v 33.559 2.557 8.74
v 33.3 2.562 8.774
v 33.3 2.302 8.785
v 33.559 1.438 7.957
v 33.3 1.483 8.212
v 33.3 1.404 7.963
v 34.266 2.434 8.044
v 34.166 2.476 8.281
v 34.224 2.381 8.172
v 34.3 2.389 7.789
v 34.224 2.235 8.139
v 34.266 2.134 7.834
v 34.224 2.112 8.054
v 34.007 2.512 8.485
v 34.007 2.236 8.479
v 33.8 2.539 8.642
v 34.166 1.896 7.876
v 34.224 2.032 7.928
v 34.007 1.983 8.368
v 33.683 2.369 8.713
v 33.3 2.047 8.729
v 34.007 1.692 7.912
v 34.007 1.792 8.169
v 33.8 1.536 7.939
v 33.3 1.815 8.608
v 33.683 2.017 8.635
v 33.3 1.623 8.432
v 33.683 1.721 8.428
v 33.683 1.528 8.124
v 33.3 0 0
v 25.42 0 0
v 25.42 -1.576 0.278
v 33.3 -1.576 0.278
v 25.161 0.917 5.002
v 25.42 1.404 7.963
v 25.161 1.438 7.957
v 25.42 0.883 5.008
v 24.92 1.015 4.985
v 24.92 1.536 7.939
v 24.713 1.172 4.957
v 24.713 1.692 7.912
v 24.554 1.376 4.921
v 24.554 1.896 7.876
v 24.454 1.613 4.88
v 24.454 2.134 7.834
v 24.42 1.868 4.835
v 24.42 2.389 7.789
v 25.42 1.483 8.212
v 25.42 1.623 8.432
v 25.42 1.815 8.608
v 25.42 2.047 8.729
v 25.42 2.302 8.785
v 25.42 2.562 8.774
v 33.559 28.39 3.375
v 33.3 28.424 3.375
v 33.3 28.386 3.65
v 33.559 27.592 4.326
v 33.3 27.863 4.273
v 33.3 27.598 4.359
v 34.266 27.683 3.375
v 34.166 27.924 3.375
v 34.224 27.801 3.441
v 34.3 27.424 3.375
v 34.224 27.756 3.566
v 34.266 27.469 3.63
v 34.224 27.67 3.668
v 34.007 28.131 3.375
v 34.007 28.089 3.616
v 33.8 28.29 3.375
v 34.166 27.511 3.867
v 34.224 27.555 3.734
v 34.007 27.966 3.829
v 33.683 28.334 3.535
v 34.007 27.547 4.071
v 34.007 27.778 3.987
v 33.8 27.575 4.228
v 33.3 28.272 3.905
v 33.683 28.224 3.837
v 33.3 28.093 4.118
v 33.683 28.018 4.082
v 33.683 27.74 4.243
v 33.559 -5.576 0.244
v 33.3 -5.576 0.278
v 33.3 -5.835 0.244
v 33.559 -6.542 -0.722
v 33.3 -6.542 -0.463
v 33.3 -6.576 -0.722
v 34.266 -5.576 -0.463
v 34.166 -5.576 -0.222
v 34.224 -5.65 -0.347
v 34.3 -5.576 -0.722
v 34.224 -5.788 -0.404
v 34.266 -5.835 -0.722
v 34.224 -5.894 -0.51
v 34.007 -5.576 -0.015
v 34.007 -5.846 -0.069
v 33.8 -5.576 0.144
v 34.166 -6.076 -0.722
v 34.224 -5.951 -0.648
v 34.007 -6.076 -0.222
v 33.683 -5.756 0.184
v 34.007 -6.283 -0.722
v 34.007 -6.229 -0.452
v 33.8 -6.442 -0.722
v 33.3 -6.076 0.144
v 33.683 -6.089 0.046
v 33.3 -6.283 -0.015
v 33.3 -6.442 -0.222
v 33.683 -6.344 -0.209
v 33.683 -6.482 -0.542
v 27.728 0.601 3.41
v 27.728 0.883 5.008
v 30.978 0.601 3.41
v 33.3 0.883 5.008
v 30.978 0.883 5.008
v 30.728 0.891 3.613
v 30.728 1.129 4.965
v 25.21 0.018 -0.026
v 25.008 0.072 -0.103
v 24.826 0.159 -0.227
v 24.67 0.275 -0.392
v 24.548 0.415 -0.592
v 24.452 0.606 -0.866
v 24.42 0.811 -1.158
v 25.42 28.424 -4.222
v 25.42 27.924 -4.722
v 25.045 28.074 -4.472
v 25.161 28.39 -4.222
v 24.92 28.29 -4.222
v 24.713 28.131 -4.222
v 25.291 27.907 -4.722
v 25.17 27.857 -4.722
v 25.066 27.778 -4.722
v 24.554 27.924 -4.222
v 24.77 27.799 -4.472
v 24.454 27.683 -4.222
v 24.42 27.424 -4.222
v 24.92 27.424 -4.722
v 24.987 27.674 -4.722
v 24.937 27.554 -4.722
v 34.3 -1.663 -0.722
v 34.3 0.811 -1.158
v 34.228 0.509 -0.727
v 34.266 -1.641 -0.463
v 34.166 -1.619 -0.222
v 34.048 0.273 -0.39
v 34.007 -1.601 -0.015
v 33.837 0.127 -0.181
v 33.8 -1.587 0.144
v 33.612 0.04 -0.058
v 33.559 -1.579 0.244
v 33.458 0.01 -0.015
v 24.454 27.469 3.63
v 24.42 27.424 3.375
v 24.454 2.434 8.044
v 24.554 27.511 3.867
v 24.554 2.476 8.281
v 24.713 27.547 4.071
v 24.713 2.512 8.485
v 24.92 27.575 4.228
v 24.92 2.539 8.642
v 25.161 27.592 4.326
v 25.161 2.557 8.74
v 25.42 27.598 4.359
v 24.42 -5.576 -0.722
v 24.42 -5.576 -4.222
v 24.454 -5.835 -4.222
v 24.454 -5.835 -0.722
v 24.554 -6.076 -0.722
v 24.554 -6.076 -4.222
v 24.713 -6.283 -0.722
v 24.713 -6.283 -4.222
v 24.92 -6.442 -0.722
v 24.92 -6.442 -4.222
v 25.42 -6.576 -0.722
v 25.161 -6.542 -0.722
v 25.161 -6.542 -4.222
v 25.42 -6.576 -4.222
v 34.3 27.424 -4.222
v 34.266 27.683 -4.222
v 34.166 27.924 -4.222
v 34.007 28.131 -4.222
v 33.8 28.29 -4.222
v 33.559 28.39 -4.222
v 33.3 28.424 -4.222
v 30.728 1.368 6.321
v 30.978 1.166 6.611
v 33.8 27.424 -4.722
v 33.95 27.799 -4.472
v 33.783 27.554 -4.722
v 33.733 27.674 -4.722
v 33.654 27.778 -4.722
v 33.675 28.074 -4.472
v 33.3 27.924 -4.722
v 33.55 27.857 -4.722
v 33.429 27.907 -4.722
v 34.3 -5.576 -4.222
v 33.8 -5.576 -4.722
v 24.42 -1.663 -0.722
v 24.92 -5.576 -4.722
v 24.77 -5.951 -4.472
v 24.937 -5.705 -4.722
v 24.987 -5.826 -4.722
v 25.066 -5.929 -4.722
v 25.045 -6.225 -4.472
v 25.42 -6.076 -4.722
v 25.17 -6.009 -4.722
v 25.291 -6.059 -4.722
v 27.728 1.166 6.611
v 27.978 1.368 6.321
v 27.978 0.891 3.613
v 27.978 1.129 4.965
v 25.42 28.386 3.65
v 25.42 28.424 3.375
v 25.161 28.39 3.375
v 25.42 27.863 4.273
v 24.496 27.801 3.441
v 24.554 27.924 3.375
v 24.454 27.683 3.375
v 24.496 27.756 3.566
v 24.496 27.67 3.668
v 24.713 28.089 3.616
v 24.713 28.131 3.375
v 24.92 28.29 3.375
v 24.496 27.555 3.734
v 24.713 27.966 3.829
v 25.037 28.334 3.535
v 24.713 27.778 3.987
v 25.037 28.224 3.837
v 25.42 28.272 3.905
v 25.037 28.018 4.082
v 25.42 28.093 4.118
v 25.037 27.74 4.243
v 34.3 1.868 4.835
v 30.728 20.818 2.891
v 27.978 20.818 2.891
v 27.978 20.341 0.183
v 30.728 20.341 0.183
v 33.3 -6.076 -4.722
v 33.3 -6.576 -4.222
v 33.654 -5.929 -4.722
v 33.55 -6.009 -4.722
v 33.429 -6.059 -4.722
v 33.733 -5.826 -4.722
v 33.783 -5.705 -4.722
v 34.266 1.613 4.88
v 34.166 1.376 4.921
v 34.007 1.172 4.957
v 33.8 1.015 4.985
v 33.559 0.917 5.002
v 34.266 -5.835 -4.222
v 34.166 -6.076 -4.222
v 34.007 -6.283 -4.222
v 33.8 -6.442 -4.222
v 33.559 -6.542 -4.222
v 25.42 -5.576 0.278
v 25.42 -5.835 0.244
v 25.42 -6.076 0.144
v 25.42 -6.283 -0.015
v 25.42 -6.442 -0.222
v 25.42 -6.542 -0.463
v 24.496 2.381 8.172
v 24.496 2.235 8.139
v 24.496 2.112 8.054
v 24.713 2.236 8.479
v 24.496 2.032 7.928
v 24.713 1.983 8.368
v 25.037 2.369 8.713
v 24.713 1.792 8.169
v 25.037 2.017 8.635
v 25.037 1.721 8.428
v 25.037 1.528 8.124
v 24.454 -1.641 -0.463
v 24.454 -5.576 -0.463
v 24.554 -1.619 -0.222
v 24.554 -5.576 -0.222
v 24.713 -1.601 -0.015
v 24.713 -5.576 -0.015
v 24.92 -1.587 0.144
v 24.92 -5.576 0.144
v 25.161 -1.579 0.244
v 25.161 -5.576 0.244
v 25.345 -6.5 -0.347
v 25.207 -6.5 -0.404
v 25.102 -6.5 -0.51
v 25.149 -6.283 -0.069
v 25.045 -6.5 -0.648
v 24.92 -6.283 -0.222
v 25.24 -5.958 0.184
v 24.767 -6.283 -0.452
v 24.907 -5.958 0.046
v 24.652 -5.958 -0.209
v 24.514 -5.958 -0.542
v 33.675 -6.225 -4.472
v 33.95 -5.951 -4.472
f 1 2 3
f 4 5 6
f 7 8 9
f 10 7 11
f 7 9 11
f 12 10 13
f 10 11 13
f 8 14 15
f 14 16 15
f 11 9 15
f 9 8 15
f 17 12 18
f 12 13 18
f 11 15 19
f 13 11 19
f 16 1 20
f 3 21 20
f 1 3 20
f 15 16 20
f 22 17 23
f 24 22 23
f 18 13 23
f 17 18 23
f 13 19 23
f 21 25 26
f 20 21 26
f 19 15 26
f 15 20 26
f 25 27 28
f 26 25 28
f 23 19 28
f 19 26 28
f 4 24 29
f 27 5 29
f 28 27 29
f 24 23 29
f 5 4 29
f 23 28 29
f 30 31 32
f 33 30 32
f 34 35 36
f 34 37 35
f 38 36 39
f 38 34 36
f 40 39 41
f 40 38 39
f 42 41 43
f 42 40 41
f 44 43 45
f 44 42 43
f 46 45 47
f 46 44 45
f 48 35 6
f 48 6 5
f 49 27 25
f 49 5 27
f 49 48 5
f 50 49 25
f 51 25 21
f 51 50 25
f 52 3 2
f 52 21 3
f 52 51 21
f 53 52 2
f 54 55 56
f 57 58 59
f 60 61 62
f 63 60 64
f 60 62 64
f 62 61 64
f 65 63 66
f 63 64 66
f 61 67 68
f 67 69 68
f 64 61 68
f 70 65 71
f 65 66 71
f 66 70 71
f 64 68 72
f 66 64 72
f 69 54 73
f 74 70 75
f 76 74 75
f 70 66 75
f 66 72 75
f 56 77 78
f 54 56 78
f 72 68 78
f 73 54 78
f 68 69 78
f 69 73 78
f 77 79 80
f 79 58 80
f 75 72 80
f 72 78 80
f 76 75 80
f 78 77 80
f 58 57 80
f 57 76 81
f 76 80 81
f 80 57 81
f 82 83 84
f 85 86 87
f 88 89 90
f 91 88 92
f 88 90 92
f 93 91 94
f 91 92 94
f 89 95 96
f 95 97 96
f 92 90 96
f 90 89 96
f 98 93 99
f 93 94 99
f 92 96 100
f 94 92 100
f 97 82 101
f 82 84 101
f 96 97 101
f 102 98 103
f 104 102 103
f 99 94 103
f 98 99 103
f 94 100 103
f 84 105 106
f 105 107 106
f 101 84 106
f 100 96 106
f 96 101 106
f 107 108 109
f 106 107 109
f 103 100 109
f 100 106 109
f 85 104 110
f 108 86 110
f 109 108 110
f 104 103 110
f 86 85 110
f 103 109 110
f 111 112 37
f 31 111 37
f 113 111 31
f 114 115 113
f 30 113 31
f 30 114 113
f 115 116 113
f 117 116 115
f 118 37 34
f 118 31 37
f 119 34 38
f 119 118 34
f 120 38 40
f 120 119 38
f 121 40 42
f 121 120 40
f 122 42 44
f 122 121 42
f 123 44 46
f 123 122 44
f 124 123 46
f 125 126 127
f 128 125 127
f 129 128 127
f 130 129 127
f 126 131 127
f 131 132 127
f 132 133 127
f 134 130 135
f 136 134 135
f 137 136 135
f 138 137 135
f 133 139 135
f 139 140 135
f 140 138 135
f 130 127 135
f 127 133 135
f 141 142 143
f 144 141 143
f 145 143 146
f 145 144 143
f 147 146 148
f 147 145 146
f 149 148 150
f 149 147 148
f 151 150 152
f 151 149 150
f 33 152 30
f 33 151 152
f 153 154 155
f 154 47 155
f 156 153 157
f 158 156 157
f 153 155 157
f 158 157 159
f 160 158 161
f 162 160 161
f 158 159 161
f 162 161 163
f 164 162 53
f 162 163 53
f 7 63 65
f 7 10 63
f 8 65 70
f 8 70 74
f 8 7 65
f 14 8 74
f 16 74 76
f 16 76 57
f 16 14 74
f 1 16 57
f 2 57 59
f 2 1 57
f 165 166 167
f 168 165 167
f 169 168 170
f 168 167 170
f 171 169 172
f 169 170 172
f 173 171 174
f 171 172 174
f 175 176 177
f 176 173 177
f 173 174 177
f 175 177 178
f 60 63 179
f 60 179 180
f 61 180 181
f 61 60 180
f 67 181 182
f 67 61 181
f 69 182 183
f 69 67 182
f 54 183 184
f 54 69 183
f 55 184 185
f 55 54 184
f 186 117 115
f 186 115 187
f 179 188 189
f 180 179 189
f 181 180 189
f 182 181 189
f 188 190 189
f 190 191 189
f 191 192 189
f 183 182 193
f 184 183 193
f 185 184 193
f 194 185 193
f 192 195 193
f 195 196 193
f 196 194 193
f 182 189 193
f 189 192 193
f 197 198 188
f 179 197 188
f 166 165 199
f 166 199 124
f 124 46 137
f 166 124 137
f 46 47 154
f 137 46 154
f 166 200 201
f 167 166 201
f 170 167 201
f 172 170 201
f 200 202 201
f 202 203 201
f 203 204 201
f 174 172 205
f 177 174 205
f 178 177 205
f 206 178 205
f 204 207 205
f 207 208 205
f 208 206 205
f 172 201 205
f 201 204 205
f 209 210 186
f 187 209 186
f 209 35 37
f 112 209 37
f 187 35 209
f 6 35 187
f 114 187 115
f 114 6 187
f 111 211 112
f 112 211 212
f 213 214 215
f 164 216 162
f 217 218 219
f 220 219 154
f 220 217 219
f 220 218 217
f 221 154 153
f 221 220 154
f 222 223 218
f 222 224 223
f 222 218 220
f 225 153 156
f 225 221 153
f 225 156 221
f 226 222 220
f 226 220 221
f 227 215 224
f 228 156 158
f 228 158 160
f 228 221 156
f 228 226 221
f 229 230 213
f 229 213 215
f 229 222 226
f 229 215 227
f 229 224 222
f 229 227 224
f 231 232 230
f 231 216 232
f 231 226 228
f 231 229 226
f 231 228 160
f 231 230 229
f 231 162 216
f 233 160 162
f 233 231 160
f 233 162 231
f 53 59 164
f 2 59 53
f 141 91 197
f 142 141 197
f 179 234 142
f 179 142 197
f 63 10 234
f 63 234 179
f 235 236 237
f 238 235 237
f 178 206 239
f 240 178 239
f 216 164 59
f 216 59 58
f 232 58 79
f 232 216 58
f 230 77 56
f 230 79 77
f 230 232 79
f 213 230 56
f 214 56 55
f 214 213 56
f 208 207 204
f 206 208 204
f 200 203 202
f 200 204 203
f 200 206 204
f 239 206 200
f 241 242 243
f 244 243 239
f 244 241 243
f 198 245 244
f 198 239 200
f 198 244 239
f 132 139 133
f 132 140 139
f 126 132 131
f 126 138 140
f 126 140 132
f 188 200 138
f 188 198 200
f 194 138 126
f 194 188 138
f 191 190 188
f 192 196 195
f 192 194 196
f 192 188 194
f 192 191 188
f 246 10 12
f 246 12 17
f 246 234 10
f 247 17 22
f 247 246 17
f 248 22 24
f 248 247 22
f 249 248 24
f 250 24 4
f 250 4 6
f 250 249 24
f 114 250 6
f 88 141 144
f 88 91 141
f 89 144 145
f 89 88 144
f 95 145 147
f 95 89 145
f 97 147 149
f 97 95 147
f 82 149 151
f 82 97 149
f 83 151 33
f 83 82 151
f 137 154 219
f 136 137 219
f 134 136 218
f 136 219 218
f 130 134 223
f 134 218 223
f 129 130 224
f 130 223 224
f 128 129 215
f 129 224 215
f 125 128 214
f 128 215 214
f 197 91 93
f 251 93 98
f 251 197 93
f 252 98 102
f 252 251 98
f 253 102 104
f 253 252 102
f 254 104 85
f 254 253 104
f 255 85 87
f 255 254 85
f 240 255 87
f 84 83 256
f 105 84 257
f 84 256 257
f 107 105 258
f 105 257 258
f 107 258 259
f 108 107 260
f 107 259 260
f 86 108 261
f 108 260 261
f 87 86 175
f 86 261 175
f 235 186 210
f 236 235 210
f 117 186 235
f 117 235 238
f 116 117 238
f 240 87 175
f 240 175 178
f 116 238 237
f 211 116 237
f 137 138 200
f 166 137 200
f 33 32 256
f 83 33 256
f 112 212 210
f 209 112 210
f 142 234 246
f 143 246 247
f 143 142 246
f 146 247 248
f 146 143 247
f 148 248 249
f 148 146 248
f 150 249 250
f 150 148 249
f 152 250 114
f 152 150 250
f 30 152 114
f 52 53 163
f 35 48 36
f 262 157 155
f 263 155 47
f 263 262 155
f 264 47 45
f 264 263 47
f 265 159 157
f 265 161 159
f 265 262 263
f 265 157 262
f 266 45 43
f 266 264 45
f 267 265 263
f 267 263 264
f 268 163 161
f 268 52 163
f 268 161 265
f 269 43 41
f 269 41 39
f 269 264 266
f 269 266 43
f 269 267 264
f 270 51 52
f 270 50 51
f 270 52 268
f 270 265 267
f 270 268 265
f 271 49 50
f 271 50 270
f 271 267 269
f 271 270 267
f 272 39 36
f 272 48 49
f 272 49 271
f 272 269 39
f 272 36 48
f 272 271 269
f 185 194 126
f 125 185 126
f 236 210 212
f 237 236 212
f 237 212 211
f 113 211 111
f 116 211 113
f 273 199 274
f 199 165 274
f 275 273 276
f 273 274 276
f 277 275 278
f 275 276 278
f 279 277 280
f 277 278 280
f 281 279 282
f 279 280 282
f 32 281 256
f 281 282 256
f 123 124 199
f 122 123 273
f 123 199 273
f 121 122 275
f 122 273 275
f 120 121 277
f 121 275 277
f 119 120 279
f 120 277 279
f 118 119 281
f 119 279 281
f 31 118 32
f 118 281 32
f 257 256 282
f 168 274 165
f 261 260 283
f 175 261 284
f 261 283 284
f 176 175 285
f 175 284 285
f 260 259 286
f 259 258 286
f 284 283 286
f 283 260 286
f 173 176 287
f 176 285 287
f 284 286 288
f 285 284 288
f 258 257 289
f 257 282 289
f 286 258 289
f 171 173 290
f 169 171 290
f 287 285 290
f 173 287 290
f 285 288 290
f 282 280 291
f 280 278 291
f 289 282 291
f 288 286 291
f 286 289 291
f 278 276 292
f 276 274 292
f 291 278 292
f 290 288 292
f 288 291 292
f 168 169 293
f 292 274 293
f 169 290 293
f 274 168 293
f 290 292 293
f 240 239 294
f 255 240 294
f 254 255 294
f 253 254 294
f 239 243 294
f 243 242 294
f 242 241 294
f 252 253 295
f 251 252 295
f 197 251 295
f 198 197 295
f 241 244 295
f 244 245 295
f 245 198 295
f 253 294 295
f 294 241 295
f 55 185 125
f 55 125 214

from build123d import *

# Parameters (mm, degrees)
PAD_DEPTH       = 9.88
SKETCH001_W     = 2.75
SKETCH001_H     = 2.75
POCKET_DEPTH    = 20
FILLET_R        = 1
CHAMFER_SIZE    = 0.5
CHAMFER001_SIZE = 0.25


with BuildPart() as foot:
    # Sketch → Pad (new body)
    with BuildSketch(Plane.YZ):
        Polygon((1.57769, 8.947526), (0.883098, 5.008295), (0, 0), (-1.575692, 0.277837), (-6.575692, 0.277837), (-6.575692, -4.722163), (28.424308, -4.722163), (28.424308, 4.213743), align=None)
    extrude(amount=PAD_DEPTH)

    # Sketch001 (on Face9 of Pad) → Pocket (cut)
    with BuildSketch(Plane(origin=(0, 0, 0), x_dir=(0, -0.173648, -0.984808), z_dir=(0, -0.984808, 0.173648))):
        with Locations((-5.087502, 4.946713)):
            Rectangle(SKETCH001_W, SKETCH001_H)
    extrude(amount=-POCKET_DEPTH, mode=Mode.SUBTRACT)

    # Fillet
    fillet_edges = [foot.edges().sort_by_distance(p)[0] for p in [
        (9.88, -4.075692, 0.277837),
        (4.94, -6.575692, 0.277837),
        (0, -4.075692, 0.277837),
        (4.94, 1.57769, 8.947526),
        (0, 15.000999, 6.580635),
        (9.88, 15.000999, 6.580635),
        (9.88, 0.788845, 4.473763),
        (0, 0.788845, 4.473763),
        (4.94, 28.424308, 4.213743),
        (9.88, 28.424308, -0.25421),
        (9.88, -0.787846, 0.138919),
        (0, -0.787846, 0.138919),
        (9.88, -6.575692, -2.222163),
        (0, -6.575692, -2.222163),
        (0, 28.424308, -0.25421),
    ]]
    fillet(fillet_edges, radius=FILLET_R)

    # Chamfer
    chamfer_edges = [foot.edges().sort_by_distance(p)[0] for p in [
        (0, 10.924308, -4.722163),
    ]]
    chamfer(chamfer_edges, length=CHAMFER_SIZE)

    # Chamfer001
    chamfer001_edges = [foot.edges().sort_by_distance(p)[0] for p in [
        (3.571713, 0.883435, 5.010211),
        (4.946713, 1.122202, 6.364322),
        (6.321713, 0.883435, 5.010211),
        (4.946713, 0.644669, 3.656101),
    ]]
    chamfer(chamfer001_edges, length=CHAMFER001_SIZE)


with BuildPart() as foot_1:
    # Body placement: moved
    add(foot.part.moved(Location((-34.3, 0, 0))))


with BuildPart() as foot_mirror:
    # Part__Mirroring: instance of Foot
    add(foot_1.part.mirror(Plane(origin=(0, 0, 0), x_dir=(0, -1, 0), z_dir=(1, 0, 0))))


solid = foot_mirror.part
